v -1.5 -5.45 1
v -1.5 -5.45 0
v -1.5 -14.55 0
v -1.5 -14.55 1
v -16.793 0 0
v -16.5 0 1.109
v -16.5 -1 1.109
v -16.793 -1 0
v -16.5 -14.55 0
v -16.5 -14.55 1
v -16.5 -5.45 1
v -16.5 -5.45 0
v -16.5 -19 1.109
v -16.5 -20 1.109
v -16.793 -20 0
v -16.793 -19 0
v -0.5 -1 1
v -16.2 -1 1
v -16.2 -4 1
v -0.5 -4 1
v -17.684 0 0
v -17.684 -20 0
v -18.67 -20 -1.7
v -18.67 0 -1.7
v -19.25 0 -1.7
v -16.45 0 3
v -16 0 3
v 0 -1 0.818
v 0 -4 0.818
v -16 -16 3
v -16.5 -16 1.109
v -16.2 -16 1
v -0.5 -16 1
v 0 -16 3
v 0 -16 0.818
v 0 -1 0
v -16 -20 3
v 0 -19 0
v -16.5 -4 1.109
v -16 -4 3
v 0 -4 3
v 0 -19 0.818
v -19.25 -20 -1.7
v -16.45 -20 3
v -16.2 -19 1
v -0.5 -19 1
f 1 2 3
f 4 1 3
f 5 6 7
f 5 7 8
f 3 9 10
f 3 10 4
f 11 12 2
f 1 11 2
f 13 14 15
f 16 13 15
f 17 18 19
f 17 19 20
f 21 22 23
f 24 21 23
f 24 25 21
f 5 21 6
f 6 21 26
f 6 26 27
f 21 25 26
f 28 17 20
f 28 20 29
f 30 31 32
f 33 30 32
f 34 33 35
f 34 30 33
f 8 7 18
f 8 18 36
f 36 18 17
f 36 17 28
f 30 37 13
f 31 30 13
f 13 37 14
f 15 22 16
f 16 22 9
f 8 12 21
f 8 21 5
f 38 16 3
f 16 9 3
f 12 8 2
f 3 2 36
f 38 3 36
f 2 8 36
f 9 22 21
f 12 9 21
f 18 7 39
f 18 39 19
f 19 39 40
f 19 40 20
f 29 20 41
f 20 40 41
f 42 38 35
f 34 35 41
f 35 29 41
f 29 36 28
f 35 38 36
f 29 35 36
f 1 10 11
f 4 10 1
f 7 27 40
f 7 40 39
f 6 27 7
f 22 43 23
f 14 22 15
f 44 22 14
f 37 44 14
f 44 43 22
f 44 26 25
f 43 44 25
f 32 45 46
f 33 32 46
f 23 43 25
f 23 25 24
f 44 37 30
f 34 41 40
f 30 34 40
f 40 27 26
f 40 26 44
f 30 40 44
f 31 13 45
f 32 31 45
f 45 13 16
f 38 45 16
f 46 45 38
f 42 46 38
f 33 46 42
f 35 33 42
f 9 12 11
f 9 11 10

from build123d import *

# Parameters (mm, degrees)
F1_DEPTH  = 20
F3_DEPTH  = 4
F5_DEPTH  = 1
F7_DEPTH  = 20.001
F10_W     = 15
F10_H     = 9.1
F11_DEPTH = 1


# Not quite as in the source:
# - a pattern or mirror of a feature is missing from the dataset's text; its kind, count and spacing are read off the source's solid


with BuildPart() as f1:
    # F0 (on Front) → F1 (new body)
    with BuildSketch(Plane.XZ):
        Polygon((-16.45, 3), (-19.25, -1.7), (-18.09, -1.7), (-17.0772340426, 0), (0, 0), (0, 3), align=None)
    extrude(amount=F1_DEPTH)

    # F2 (on face) → F3 (cut)
    with BuildSketch(Plane.XZ.offset(20)):
        Polygon((-16.2, 1), (-0.5, 1), (0, 0.8180148829), (0, 3), (-16, 3), (-16.5, 1.1091910703), align=None)
    f3 = extrude(amount=-F3_DEPTH, mode=Mode.SUBTRACT)

    # F3_copies: F3 across plane
    add(f3.mirror(Plane.ZX.offset(-10)), mode=Mode.SUBTRACT)

    # F4 (on face) → F5 (cut)
    with BuildSketch(Plane.XZ.offset(20)):
        Polygon((0, -1), (0, 0.8180148829), (-0.5, 1), (-16.2, 1), (-16.5, 1.1091910703), (-17.0577483365, -1), align=None)
    f5 = extrude(amount=-F5_DEPTH, mode=Mode.SUBTRACT)

    # F5_copies: F5 across plane
    add(f5.mirror(Plane.ZX.offset(-10)), mode=Mode.SUBTRACT)

    # F6 (on face) → F7 (cut, through all)
    with BuildSketch(Plane.XZ.offset(20)):
        Polygon((-18.67, -1.7), (-18.09, -1.7), (-17.0772340426, 0), (-17.683862779, 0), align=None)
    extrude(amount=-F7_DEPTH, mode=Mode.SUBTRACT)

    # F10 (on face) → F11 (cut)
    with BuildSketch(Plane(origin=(0, 0, 0), x_dir=(1, 0, 0), z_dir=(0, 0, -1))):
        with Locations((-9, 10)):
            Rectangle(F10_W, F10_H)
    extrude(amount=-F11_DEPTH, mode=Mode.SUBTRACT)


solid = f1.part
